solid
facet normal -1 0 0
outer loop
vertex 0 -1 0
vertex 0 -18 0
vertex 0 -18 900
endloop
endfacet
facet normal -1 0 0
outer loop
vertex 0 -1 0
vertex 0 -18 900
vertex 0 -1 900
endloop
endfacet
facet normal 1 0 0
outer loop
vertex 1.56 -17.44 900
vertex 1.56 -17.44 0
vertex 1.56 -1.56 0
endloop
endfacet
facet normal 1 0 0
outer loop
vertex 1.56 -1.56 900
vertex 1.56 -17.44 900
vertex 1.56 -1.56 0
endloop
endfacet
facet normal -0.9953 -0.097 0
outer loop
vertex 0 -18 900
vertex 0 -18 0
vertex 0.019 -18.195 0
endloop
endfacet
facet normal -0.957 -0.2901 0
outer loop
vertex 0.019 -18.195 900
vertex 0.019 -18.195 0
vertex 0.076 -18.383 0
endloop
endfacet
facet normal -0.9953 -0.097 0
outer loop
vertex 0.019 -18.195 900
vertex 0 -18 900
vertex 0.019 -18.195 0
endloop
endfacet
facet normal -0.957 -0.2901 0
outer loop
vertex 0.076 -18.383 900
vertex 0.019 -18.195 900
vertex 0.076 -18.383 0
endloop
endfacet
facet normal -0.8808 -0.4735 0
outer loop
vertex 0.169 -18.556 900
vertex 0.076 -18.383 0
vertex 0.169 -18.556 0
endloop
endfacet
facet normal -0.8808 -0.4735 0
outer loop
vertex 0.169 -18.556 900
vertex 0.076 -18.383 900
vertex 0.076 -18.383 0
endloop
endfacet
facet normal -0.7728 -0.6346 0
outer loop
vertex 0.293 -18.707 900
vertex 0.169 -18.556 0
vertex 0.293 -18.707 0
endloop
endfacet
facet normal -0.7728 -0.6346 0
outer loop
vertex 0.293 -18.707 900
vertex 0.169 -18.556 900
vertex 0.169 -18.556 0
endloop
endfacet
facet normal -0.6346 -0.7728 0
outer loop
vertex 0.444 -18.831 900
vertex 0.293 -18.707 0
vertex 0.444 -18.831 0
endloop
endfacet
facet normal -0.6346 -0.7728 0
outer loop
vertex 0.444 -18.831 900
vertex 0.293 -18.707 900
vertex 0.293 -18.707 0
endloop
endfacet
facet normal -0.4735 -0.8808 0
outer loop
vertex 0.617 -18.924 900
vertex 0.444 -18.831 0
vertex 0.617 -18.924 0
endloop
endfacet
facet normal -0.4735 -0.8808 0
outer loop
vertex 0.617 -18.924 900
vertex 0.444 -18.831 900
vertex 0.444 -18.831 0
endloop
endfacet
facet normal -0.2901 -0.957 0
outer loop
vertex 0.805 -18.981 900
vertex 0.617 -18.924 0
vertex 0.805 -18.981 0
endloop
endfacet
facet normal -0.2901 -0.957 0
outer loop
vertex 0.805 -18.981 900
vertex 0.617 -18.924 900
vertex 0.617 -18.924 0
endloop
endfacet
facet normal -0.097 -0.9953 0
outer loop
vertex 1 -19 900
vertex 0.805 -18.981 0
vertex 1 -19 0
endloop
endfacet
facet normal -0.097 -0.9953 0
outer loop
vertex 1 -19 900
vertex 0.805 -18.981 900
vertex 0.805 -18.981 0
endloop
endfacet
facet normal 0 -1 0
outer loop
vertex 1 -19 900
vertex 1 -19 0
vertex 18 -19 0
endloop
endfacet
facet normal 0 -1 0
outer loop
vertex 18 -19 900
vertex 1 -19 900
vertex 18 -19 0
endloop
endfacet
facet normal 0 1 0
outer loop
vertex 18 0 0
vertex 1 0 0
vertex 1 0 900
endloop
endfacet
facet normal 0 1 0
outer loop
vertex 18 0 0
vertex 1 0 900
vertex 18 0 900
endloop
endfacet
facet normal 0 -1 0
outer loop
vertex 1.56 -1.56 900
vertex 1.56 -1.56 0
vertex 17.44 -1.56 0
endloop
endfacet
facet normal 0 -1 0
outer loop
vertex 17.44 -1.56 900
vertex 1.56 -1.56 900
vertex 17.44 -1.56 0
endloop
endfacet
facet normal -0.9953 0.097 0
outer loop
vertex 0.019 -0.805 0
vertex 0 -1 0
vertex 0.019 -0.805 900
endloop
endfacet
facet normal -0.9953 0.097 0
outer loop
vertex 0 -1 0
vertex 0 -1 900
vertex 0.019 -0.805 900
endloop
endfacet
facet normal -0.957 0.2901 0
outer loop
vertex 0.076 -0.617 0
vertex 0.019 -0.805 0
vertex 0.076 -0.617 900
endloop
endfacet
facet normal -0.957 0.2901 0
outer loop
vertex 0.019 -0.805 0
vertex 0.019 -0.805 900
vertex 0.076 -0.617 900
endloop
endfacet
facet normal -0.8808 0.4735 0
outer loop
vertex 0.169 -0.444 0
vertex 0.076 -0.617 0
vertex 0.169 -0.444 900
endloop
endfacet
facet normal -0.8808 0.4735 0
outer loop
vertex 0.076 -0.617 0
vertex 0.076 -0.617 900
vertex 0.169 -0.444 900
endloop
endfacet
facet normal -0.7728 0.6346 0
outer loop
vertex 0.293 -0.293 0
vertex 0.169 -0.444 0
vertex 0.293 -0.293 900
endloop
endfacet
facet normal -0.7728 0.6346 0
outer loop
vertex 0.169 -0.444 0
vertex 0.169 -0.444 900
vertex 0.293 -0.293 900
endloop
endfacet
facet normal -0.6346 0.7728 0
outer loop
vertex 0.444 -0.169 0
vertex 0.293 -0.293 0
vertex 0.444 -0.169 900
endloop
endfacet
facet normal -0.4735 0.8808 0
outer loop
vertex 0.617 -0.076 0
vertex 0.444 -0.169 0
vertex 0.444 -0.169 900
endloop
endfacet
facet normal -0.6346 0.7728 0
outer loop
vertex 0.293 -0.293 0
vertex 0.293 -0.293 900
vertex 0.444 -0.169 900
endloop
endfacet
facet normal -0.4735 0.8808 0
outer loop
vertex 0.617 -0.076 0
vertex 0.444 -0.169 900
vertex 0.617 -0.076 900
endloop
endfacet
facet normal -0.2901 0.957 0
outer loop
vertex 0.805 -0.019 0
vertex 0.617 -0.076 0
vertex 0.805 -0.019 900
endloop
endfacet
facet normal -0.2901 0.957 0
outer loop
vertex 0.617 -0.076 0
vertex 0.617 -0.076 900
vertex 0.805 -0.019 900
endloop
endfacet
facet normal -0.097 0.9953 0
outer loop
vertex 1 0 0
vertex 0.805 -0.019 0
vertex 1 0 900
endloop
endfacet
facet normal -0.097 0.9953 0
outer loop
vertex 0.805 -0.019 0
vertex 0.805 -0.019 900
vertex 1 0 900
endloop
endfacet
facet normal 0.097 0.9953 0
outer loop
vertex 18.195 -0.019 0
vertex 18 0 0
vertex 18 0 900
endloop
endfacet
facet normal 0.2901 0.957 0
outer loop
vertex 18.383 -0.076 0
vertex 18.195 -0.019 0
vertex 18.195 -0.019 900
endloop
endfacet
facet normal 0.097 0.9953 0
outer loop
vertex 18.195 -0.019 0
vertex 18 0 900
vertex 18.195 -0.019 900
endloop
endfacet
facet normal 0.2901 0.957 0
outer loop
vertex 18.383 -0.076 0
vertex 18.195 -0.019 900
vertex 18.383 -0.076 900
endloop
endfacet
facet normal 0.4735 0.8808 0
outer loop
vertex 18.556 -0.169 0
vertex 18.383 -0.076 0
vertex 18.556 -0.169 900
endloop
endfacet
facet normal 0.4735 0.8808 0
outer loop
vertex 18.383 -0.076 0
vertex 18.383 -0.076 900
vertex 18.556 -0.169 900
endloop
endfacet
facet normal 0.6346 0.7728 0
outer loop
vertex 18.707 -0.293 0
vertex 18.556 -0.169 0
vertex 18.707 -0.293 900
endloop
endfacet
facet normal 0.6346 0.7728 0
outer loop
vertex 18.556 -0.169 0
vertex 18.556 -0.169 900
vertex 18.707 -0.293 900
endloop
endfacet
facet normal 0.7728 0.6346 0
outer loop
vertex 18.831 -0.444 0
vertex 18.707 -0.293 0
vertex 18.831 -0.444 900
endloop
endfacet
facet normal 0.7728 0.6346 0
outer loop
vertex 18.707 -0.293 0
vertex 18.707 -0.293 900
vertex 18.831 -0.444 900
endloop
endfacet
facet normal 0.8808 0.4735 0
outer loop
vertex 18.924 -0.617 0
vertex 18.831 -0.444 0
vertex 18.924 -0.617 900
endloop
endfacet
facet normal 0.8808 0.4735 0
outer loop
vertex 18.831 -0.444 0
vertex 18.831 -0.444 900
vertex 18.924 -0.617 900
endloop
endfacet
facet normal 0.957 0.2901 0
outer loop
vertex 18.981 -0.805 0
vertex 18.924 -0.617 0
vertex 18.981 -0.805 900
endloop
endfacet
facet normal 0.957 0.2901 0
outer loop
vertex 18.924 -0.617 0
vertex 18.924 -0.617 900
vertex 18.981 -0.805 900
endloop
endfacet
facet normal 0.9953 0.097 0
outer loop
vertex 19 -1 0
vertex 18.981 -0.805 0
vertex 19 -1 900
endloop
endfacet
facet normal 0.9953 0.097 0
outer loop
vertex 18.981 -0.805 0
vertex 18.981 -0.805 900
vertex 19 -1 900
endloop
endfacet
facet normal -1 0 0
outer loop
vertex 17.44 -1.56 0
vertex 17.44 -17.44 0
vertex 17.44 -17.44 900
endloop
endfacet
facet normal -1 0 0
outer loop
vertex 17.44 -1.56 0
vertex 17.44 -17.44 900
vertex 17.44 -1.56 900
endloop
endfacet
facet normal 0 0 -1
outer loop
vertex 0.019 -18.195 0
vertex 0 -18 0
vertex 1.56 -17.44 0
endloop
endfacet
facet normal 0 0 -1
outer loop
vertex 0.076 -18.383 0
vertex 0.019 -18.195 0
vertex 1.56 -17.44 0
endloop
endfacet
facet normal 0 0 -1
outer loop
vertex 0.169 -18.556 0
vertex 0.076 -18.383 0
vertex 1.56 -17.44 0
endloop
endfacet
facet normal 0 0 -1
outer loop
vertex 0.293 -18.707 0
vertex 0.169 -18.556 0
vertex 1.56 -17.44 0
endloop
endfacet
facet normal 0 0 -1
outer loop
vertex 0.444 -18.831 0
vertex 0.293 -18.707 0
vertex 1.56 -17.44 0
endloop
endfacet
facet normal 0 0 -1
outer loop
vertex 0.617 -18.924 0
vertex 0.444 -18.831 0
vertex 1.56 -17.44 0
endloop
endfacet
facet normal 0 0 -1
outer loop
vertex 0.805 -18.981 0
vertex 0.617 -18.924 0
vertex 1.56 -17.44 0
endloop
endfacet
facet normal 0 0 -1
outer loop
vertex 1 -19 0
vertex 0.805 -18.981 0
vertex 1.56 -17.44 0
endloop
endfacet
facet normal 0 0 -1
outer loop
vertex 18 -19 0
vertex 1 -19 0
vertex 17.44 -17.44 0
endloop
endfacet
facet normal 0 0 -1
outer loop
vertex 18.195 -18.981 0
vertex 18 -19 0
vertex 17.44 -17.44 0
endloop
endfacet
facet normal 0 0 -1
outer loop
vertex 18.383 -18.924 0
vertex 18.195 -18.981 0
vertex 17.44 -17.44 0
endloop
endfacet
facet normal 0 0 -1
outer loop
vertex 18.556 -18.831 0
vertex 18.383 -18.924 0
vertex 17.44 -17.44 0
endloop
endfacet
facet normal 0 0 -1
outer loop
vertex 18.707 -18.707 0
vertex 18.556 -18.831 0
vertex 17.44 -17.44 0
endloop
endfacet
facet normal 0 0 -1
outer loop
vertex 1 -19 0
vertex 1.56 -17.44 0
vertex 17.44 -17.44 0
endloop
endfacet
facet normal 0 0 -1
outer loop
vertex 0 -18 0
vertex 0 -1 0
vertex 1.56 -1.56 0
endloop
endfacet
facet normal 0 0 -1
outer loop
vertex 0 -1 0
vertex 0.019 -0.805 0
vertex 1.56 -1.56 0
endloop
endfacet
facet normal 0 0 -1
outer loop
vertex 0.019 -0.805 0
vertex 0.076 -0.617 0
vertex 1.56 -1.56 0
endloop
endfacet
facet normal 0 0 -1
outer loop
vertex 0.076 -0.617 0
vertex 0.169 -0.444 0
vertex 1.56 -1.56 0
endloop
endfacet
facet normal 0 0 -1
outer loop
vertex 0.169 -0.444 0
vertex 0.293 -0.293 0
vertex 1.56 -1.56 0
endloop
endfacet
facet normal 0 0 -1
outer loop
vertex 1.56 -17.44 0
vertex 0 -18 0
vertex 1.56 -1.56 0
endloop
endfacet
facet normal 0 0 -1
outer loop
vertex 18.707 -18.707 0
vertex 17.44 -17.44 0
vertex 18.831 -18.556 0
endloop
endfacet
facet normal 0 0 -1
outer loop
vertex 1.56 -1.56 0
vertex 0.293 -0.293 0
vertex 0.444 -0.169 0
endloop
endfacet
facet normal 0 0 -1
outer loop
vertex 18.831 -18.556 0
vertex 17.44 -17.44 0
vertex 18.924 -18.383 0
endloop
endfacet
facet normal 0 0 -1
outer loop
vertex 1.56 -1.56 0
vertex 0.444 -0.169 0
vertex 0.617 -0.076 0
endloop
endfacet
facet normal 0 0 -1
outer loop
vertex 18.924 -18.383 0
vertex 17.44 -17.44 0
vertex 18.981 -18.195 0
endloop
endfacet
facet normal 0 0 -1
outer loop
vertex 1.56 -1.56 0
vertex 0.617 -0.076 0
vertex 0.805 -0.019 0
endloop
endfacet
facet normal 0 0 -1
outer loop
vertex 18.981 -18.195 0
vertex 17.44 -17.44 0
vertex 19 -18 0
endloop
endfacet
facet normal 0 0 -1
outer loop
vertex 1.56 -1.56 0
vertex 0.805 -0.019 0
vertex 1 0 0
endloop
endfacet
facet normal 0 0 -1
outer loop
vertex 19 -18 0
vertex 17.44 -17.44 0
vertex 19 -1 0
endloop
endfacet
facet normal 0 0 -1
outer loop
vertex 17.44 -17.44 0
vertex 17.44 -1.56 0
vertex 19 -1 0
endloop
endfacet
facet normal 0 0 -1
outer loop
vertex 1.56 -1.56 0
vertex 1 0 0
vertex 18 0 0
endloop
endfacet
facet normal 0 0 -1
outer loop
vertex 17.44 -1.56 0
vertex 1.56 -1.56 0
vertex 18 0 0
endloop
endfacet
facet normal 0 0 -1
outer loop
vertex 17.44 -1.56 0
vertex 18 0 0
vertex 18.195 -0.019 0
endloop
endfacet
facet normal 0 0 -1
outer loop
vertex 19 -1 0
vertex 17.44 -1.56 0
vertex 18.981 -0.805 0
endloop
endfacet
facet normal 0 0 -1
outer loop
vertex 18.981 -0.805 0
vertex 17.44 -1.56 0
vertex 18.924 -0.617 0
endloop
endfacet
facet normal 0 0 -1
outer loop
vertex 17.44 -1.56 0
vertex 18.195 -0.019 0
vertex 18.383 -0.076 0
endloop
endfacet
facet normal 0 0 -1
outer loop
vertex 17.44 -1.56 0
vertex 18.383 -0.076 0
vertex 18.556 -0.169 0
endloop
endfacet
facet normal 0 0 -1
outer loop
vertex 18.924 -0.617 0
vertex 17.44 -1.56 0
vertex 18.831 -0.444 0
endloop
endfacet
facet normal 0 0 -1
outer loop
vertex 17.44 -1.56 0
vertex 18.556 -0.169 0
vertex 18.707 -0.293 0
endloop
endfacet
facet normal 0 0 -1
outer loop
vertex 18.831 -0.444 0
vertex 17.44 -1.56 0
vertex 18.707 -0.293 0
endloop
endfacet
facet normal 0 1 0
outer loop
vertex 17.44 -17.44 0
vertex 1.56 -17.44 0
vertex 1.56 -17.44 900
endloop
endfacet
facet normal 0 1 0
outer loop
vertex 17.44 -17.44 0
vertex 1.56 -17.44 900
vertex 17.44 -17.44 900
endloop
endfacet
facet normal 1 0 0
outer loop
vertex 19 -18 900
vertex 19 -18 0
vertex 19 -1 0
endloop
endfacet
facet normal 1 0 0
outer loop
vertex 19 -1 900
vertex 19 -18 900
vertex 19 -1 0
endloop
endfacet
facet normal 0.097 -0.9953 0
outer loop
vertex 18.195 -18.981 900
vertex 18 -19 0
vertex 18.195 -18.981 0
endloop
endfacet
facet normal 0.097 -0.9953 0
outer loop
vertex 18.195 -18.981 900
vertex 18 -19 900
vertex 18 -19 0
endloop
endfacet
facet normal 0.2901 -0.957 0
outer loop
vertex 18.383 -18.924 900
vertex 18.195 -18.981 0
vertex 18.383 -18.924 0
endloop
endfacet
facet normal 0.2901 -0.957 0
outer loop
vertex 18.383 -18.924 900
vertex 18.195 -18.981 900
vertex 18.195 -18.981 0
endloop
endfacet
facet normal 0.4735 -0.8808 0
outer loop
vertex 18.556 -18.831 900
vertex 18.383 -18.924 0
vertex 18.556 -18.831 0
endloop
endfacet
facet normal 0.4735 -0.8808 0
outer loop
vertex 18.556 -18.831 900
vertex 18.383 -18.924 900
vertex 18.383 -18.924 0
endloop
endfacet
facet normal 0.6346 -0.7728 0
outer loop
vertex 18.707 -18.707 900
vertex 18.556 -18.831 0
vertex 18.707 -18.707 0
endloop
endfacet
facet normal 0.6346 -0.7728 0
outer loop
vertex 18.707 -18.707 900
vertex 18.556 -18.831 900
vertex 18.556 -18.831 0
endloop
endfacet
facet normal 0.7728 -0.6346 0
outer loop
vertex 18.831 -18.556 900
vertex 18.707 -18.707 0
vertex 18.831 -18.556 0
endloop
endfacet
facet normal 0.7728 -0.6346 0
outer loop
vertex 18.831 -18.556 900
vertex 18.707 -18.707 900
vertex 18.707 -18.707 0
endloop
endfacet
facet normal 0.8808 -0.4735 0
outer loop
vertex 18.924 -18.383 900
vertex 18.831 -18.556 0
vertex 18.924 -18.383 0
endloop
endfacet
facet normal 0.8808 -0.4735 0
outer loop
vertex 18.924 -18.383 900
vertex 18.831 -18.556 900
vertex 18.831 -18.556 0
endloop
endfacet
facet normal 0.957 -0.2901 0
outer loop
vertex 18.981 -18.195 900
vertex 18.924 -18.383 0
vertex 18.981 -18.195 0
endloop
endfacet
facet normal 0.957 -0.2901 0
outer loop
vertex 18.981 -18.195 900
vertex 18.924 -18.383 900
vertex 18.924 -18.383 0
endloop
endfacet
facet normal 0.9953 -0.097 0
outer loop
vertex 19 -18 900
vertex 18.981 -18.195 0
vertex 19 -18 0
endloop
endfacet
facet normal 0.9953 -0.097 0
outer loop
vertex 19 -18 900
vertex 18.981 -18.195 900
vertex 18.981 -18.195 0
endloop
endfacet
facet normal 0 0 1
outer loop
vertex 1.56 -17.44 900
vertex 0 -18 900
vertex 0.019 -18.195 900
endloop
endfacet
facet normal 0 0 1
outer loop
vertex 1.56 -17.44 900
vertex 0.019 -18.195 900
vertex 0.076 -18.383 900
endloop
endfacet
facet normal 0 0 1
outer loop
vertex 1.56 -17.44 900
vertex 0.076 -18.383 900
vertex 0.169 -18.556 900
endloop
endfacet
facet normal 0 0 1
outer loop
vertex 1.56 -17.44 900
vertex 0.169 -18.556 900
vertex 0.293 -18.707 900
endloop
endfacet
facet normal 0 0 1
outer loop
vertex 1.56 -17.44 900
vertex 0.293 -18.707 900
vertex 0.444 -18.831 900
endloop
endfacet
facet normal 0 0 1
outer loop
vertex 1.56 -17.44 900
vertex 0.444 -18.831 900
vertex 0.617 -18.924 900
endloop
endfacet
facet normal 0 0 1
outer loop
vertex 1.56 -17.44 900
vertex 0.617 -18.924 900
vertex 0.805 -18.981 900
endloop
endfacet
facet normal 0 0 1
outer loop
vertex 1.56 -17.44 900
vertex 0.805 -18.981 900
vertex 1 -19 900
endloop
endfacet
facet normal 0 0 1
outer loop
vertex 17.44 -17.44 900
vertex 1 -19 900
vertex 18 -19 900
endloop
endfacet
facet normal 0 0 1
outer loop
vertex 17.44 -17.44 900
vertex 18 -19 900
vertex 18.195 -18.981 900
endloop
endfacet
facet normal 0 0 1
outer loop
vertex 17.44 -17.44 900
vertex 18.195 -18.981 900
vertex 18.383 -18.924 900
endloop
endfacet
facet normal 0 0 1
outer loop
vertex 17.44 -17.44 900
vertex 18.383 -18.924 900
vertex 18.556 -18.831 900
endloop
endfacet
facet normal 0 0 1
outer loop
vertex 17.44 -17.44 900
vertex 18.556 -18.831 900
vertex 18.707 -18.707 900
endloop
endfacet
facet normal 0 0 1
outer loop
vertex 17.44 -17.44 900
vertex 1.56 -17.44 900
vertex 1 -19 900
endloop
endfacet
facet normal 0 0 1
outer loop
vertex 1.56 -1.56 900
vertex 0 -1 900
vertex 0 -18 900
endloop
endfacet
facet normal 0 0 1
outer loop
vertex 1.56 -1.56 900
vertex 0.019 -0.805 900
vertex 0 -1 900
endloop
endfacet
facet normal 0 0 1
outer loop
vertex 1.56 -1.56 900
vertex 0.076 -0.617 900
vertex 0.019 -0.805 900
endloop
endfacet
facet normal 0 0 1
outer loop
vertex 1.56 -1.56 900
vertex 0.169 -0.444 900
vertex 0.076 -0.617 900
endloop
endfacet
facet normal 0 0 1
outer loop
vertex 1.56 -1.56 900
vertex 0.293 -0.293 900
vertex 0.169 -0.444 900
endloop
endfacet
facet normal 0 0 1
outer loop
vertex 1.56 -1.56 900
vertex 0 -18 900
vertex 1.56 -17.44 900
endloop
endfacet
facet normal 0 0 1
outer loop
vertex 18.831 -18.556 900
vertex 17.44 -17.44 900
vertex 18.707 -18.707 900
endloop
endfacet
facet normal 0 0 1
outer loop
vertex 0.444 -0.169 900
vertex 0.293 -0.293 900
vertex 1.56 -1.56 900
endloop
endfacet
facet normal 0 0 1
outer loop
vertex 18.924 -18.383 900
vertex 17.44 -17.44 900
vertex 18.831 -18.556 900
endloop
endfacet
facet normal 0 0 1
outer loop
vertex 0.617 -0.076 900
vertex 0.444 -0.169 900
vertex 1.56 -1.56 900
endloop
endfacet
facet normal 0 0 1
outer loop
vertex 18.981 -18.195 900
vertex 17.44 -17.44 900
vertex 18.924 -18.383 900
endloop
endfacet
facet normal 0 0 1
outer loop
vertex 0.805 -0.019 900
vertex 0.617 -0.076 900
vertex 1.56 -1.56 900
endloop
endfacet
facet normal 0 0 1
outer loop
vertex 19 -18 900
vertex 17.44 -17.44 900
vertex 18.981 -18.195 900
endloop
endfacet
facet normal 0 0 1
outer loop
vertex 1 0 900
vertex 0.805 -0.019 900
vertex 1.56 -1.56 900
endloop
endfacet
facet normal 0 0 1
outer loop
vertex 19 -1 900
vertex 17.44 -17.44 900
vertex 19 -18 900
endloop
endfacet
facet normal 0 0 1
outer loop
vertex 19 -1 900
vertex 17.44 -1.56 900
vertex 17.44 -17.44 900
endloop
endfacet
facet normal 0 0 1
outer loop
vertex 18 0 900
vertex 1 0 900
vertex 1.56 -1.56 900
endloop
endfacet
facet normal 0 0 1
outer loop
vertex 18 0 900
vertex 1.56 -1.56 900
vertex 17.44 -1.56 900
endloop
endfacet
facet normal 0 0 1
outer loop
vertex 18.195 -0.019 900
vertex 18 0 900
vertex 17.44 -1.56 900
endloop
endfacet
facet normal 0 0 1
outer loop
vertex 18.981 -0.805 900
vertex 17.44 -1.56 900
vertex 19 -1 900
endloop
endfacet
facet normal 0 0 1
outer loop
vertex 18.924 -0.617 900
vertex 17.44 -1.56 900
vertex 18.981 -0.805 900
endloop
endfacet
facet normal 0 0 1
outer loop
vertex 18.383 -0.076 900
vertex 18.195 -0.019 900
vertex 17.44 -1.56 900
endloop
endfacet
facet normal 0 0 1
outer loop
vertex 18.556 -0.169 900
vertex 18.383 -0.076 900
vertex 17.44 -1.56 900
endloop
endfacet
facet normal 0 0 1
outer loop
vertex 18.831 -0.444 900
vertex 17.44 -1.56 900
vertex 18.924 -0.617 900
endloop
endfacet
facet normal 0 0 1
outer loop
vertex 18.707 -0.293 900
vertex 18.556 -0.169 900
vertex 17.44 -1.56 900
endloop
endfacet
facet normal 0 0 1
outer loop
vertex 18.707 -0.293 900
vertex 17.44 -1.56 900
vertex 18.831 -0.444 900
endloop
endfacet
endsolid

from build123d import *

# Parameters (mm, degrees)
SKETCH_1_W      = 19
SKETCH_1_H      = 19
SKETCH_1_W_2    = 15.88
SKETCH_1_H_2    = 15.88
EXTRUDE_1_DEPTH = 900
FILLET_2_R      = 1


with BuildPart() as part:
    # 스케치1 → 보스-돌출1 (new body)
    with BuildSketch(Plane.XY):
        with Locations((9.5, -9.5)):
            Rectangle(SKETCH_1_W, SKETCH_1_H)
        with Locations((9.5, -9.5)):
            Rectangle(SKETCH_1_W_2, SKETCH_1_H_2, mode=Mode.SUBTRACT)
    extrude(amount=EXTRUDE_1_DEPTH)

    # 필렛2
    fillet_2_edges = [part.edges().sort_by_distance(p)[0] for p in [
        (0, 0, 450),
        (19, 0, 450),
        (19, -19, 450),
        (0, -19, 450),
    ]]
    fillet(fillet_2_edges, radius=FILLET_2_R)


solid = part.part
